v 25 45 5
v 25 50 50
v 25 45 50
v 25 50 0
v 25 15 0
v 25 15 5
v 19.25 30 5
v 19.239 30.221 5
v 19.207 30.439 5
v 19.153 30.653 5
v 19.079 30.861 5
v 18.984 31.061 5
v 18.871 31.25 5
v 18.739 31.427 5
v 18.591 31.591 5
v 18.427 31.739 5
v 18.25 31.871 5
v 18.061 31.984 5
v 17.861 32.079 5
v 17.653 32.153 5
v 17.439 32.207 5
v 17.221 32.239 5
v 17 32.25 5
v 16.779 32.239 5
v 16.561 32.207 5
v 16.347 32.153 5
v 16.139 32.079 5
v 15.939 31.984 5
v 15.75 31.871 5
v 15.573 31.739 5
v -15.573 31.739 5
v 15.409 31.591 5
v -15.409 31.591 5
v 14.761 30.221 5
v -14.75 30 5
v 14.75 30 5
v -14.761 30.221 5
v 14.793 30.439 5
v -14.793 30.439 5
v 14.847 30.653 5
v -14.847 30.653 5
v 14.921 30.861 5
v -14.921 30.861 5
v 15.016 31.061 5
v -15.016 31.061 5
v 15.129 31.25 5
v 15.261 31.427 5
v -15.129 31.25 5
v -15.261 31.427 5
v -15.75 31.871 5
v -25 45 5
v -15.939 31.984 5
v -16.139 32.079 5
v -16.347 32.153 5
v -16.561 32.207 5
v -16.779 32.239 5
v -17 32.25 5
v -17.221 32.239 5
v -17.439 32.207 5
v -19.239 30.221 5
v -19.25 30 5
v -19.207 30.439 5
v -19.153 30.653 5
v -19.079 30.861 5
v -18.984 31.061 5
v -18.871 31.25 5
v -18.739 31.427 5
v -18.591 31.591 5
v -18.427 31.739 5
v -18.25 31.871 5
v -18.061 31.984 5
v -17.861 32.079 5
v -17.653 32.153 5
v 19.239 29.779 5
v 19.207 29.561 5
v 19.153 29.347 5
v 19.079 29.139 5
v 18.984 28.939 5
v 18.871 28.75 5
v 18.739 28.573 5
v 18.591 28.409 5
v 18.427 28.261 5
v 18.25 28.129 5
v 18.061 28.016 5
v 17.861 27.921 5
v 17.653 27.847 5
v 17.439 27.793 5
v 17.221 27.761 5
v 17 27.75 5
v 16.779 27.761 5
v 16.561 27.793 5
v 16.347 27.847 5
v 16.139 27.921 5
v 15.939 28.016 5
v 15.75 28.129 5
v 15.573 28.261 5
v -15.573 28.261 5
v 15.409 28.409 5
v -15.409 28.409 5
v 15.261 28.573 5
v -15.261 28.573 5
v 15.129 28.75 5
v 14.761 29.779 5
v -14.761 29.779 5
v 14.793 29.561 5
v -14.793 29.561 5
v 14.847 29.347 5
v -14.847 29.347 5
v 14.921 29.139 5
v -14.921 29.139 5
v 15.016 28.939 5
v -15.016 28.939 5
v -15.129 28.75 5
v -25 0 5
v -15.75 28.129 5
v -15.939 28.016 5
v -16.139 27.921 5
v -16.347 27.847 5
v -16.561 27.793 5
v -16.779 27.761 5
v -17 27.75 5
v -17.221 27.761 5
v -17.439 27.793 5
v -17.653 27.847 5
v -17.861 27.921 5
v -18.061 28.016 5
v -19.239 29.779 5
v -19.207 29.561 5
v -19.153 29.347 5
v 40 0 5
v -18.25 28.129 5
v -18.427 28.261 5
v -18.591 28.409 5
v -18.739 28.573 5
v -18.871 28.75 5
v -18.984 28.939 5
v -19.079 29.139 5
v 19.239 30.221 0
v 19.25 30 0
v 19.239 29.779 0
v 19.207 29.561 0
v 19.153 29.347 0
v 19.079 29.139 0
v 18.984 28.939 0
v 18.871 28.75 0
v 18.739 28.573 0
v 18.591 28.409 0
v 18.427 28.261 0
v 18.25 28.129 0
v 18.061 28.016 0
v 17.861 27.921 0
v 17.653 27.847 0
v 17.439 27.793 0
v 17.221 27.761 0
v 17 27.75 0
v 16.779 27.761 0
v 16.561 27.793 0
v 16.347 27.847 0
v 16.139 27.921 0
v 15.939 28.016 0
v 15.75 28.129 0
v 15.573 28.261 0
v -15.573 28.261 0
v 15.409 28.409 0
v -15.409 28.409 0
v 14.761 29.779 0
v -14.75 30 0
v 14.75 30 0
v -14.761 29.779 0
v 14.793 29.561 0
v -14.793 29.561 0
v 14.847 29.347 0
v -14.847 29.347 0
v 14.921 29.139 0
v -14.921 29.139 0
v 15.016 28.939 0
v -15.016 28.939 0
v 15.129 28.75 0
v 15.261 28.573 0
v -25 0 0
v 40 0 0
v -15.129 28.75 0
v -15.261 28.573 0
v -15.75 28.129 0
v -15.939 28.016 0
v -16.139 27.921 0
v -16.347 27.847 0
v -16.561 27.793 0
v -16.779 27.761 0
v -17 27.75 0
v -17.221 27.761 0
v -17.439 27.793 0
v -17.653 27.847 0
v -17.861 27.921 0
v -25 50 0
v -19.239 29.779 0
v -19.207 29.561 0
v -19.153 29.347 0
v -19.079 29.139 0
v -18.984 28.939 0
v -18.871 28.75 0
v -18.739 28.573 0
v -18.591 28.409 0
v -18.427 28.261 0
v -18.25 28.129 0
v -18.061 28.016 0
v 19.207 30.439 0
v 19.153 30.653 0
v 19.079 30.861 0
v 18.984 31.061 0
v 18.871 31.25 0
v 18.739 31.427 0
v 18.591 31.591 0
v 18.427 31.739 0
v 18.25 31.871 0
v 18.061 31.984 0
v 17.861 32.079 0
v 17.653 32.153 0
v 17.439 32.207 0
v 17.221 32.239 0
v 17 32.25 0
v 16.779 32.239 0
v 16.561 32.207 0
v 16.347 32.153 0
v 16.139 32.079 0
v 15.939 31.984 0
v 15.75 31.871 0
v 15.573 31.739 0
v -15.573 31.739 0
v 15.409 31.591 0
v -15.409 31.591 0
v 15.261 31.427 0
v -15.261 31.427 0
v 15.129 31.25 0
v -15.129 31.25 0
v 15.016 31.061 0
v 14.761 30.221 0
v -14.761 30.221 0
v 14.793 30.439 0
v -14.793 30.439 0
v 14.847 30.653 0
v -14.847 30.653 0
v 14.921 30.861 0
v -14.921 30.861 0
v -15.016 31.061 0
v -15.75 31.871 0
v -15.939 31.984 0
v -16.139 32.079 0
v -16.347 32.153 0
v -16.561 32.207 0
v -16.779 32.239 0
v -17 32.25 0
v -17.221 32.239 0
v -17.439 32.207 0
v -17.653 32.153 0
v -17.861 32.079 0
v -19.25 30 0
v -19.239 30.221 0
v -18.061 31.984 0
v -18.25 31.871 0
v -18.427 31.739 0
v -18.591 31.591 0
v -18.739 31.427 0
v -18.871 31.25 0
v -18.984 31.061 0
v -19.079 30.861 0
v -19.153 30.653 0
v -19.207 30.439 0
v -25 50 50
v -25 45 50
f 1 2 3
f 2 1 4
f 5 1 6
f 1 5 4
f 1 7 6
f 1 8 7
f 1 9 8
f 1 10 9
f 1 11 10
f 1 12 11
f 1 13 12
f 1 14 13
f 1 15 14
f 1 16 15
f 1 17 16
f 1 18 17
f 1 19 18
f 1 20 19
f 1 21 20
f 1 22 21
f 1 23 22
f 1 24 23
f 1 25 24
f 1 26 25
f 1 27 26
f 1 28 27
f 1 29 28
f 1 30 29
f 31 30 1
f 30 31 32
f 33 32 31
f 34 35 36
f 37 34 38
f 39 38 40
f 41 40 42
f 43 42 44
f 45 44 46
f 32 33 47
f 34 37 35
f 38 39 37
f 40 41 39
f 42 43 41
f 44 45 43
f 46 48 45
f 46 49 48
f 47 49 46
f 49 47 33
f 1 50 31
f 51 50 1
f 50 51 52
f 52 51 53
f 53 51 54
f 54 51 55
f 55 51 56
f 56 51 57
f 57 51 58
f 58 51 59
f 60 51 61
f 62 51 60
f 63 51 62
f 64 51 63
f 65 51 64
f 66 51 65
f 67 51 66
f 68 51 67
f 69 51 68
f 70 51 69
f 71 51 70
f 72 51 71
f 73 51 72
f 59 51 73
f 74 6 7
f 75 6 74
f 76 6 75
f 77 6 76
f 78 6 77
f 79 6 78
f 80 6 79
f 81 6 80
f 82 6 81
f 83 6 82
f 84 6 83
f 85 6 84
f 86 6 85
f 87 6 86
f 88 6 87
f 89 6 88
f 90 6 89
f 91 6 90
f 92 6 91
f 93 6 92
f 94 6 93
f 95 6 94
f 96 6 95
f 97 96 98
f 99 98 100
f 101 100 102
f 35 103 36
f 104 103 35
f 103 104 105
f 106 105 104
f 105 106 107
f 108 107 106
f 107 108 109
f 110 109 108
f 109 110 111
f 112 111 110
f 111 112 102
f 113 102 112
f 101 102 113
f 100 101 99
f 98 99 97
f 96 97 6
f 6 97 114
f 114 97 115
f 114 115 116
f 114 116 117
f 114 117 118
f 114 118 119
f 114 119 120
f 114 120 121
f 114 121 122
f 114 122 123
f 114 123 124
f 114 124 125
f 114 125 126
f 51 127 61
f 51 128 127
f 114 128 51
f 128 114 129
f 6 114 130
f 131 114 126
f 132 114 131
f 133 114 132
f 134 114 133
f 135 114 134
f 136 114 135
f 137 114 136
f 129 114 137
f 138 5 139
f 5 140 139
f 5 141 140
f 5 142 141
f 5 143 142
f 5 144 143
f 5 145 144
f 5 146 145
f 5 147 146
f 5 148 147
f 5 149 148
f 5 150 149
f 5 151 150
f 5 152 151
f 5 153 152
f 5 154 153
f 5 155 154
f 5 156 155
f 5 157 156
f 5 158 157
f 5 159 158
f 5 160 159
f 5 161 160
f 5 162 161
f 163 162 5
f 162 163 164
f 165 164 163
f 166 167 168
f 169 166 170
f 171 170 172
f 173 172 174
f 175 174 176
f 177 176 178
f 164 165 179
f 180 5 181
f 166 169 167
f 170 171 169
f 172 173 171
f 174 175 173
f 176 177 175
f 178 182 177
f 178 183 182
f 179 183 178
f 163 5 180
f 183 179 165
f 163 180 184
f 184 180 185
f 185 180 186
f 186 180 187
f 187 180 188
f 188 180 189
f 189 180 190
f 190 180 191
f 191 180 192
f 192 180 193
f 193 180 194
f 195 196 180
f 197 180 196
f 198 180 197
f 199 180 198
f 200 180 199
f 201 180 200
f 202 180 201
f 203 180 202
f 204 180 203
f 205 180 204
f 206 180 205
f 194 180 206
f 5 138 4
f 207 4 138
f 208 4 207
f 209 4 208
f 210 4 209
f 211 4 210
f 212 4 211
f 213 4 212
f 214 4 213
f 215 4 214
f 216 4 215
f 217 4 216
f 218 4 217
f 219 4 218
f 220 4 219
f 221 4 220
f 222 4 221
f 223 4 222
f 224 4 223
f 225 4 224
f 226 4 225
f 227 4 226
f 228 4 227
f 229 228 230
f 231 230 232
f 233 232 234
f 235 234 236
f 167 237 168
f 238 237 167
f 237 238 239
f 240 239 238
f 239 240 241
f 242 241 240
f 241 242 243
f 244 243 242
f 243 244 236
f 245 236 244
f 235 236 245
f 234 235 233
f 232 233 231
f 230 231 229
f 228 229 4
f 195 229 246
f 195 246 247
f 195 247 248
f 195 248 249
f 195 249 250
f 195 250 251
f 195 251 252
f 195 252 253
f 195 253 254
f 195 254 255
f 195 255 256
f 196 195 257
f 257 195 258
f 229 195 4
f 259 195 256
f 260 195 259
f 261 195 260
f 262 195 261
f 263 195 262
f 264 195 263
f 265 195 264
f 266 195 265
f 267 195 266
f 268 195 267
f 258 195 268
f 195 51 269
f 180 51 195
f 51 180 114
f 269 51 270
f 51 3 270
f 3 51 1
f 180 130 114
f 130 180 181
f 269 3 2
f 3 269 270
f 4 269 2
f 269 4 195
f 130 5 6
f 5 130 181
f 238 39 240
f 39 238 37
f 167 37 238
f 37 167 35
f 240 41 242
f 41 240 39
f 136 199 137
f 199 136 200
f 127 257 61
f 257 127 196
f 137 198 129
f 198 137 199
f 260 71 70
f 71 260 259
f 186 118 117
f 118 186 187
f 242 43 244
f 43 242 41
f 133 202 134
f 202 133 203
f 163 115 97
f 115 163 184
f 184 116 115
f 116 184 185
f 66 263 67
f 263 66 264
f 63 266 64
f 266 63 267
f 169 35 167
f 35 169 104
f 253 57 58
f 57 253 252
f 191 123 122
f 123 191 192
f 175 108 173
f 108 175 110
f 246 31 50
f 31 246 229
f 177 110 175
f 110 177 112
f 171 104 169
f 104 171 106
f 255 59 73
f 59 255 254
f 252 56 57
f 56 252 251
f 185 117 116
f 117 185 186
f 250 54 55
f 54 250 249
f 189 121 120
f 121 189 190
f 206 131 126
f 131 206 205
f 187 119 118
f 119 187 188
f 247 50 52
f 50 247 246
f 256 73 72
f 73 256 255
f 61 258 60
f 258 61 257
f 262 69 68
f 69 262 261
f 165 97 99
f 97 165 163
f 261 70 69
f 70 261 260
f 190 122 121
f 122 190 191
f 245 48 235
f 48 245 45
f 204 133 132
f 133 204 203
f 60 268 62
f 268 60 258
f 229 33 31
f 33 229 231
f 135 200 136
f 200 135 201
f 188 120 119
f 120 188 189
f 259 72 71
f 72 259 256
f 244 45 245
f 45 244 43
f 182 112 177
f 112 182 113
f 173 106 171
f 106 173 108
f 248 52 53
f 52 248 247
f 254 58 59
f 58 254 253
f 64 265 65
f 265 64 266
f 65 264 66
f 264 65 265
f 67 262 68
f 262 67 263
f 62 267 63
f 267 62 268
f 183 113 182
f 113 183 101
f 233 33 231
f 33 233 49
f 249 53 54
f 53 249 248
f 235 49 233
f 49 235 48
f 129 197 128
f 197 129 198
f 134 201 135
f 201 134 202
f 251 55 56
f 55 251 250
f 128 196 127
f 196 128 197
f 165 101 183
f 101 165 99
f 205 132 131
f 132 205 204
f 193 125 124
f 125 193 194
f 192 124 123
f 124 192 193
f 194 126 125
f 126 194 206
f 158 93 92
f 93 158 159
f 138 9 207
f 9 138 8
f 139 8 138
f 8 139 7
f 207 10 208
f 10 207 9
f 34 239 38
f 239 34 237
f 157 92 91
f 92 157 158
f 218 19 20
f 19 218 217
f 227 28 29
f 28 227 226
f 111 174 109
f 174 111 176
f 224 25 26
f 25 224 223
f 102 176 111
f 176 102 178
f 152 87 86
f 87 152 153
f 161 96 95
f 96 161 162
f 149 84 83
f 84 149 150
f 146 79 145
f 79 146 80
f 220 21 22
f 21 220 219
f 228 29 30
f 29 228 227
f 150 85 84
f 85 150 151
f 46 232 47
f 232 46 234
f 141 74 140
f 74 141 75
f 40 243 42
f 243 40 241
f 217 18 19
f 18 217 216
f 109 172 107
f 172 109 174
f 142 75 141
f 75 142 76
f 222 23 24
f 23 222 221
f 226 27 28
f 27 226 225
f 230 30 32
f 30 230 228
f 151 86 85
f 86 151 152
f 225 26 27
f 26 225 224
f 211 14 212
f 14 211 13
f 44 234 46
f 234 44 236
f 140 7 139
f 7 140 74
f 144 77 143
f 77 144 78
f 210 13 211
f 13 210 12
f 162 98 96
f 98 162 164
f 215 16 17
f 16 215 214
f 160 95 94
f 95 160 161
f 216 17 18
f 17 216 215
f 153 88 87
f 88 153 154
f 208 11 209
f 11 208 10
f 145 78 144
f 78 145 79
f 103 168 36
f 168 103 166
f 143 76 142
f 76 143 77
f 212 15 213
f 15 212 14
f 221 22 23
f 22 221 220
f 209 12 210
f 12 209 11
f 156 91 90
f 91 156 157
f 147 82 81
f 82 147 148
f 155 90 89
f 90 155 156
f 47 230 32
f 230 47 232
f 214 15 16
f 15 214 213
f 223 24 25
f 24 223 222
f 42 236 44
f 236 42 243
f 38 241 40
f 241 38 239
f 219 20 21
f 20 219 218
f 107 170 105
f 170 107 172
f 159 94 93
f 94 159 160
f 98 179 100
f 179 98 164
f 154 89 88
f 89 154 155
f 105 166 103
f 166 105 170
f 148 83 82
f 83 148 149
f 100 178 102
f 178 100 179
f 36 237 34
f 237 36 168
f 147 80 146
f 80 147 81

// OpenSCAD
// L-shaped mounting bracket for NEMA 17 stepper motor.
// Base plate: 50 x 45 x 5 mm. Motor plate: 50 x 5 x 50 mm.
// Includes M4 mounting holes, motor boss hole, M3 screw holes, and triangular gussets.

// Base plate dimensions
base_x = 50;
base_y = 45;
base_z = 5;

// Motor plate dimensions
motor_x = 50;
motor_y = 5;
motor_z = 50;

// Hole dimensions
m4_hole_d = 4.5;
m3_hole_d = 3.4;
boss_hole_d = 23;

// Gusset dimensions
gusset_thickness = 5;
gusset_leg_y = 20;
gusset_leg_z = 20;

// Hole positions
hole1_x = -17;
hole1_y = 30;
hole2_x = 17;
hole2_y = 30;

boss_x = 0;
boss_z = 28;

// Gusset positions (flush with left and right edges)
gusset_left_x_start = -25;
gusset_left_x_end = -20;
gusset_right_x_start = 20;
gusset_right_x_end = 25;

$fn = 64;

// Create the main L-shaped body
difference() {
    union() {
        // Base plate
        translate([-base_x / 2, 0, 0]) cube([base_x, base_y, base_z]);
        
        // Motor plate (standing on the back edge of the base)
        // Back edge is at y = base_y = 45.
        translate([-motor_x / 2, base_y, 0]) cube([motor_x, motor_y, motor_z]);
        
        // Gussets (triangular prisms in YZ plane, extruded along X)
        // Left Gusset
        translate([gusset_left_x_start, 0, 0]) 
            linear_extrude(gusset_left_x_end - gusset_left_x_start)
                polygon([
                    [0, 0],      // (y=0, z=0) - bottom left
                    [gusset_leg_y, 0], // (y=20, z=0) - bottom right
                    [0, gusset_leg_z]  // (y=0, z=20) - top left (right angle at 0,0)
                ]);
        
        // Right Gusset
        translate([gusset_right_x_start, 0, 0]) 
            linear_extrude(gusset_right_x_end - gusset_right_x_start)
                polygon([
                    [0, 0],      // (y=0, z=0) - bottom left
                    [gusset_leg_y, 0], // (y=20, z=0) - bottom right
                    [0, gusset_leg_z]  // (y=0, z=20) - top left (right angle at 0,0)
                ]);
    }
    
    // Cut M4 holes in base plate
    for (i = [0 : 1]) {
        translate([
            i == 0 ? hole1_x : hole2_x,
            hole1_y,
            0
        ]) cylinder(h = base_z + 1, d = m4_hole_d);
    }
    
    // Cut Motor Boss Hole
    translate([boss_x, 0, boss_z]) cylinder(h = motor_y + 1, d = boss_hole_d);
    
    // Cut M3 screw holes in motor plate
    // Pattern: 31 mm square centred on boss hole (x=0, z=28)
    // Square corners relative to center: +/- 15.5 mm
    offset_x = 15.5;
    offset_z = 15.5;
    
    for (sx = [-1, 1], sz = [-1, 1]) {
        translate([
            boss_x + sx * offset_x,
            0,
            boss_z + sz * offset_z
        ]) cylinder(h = motor_y + 1, d = m3_hole_d);
    }
}
